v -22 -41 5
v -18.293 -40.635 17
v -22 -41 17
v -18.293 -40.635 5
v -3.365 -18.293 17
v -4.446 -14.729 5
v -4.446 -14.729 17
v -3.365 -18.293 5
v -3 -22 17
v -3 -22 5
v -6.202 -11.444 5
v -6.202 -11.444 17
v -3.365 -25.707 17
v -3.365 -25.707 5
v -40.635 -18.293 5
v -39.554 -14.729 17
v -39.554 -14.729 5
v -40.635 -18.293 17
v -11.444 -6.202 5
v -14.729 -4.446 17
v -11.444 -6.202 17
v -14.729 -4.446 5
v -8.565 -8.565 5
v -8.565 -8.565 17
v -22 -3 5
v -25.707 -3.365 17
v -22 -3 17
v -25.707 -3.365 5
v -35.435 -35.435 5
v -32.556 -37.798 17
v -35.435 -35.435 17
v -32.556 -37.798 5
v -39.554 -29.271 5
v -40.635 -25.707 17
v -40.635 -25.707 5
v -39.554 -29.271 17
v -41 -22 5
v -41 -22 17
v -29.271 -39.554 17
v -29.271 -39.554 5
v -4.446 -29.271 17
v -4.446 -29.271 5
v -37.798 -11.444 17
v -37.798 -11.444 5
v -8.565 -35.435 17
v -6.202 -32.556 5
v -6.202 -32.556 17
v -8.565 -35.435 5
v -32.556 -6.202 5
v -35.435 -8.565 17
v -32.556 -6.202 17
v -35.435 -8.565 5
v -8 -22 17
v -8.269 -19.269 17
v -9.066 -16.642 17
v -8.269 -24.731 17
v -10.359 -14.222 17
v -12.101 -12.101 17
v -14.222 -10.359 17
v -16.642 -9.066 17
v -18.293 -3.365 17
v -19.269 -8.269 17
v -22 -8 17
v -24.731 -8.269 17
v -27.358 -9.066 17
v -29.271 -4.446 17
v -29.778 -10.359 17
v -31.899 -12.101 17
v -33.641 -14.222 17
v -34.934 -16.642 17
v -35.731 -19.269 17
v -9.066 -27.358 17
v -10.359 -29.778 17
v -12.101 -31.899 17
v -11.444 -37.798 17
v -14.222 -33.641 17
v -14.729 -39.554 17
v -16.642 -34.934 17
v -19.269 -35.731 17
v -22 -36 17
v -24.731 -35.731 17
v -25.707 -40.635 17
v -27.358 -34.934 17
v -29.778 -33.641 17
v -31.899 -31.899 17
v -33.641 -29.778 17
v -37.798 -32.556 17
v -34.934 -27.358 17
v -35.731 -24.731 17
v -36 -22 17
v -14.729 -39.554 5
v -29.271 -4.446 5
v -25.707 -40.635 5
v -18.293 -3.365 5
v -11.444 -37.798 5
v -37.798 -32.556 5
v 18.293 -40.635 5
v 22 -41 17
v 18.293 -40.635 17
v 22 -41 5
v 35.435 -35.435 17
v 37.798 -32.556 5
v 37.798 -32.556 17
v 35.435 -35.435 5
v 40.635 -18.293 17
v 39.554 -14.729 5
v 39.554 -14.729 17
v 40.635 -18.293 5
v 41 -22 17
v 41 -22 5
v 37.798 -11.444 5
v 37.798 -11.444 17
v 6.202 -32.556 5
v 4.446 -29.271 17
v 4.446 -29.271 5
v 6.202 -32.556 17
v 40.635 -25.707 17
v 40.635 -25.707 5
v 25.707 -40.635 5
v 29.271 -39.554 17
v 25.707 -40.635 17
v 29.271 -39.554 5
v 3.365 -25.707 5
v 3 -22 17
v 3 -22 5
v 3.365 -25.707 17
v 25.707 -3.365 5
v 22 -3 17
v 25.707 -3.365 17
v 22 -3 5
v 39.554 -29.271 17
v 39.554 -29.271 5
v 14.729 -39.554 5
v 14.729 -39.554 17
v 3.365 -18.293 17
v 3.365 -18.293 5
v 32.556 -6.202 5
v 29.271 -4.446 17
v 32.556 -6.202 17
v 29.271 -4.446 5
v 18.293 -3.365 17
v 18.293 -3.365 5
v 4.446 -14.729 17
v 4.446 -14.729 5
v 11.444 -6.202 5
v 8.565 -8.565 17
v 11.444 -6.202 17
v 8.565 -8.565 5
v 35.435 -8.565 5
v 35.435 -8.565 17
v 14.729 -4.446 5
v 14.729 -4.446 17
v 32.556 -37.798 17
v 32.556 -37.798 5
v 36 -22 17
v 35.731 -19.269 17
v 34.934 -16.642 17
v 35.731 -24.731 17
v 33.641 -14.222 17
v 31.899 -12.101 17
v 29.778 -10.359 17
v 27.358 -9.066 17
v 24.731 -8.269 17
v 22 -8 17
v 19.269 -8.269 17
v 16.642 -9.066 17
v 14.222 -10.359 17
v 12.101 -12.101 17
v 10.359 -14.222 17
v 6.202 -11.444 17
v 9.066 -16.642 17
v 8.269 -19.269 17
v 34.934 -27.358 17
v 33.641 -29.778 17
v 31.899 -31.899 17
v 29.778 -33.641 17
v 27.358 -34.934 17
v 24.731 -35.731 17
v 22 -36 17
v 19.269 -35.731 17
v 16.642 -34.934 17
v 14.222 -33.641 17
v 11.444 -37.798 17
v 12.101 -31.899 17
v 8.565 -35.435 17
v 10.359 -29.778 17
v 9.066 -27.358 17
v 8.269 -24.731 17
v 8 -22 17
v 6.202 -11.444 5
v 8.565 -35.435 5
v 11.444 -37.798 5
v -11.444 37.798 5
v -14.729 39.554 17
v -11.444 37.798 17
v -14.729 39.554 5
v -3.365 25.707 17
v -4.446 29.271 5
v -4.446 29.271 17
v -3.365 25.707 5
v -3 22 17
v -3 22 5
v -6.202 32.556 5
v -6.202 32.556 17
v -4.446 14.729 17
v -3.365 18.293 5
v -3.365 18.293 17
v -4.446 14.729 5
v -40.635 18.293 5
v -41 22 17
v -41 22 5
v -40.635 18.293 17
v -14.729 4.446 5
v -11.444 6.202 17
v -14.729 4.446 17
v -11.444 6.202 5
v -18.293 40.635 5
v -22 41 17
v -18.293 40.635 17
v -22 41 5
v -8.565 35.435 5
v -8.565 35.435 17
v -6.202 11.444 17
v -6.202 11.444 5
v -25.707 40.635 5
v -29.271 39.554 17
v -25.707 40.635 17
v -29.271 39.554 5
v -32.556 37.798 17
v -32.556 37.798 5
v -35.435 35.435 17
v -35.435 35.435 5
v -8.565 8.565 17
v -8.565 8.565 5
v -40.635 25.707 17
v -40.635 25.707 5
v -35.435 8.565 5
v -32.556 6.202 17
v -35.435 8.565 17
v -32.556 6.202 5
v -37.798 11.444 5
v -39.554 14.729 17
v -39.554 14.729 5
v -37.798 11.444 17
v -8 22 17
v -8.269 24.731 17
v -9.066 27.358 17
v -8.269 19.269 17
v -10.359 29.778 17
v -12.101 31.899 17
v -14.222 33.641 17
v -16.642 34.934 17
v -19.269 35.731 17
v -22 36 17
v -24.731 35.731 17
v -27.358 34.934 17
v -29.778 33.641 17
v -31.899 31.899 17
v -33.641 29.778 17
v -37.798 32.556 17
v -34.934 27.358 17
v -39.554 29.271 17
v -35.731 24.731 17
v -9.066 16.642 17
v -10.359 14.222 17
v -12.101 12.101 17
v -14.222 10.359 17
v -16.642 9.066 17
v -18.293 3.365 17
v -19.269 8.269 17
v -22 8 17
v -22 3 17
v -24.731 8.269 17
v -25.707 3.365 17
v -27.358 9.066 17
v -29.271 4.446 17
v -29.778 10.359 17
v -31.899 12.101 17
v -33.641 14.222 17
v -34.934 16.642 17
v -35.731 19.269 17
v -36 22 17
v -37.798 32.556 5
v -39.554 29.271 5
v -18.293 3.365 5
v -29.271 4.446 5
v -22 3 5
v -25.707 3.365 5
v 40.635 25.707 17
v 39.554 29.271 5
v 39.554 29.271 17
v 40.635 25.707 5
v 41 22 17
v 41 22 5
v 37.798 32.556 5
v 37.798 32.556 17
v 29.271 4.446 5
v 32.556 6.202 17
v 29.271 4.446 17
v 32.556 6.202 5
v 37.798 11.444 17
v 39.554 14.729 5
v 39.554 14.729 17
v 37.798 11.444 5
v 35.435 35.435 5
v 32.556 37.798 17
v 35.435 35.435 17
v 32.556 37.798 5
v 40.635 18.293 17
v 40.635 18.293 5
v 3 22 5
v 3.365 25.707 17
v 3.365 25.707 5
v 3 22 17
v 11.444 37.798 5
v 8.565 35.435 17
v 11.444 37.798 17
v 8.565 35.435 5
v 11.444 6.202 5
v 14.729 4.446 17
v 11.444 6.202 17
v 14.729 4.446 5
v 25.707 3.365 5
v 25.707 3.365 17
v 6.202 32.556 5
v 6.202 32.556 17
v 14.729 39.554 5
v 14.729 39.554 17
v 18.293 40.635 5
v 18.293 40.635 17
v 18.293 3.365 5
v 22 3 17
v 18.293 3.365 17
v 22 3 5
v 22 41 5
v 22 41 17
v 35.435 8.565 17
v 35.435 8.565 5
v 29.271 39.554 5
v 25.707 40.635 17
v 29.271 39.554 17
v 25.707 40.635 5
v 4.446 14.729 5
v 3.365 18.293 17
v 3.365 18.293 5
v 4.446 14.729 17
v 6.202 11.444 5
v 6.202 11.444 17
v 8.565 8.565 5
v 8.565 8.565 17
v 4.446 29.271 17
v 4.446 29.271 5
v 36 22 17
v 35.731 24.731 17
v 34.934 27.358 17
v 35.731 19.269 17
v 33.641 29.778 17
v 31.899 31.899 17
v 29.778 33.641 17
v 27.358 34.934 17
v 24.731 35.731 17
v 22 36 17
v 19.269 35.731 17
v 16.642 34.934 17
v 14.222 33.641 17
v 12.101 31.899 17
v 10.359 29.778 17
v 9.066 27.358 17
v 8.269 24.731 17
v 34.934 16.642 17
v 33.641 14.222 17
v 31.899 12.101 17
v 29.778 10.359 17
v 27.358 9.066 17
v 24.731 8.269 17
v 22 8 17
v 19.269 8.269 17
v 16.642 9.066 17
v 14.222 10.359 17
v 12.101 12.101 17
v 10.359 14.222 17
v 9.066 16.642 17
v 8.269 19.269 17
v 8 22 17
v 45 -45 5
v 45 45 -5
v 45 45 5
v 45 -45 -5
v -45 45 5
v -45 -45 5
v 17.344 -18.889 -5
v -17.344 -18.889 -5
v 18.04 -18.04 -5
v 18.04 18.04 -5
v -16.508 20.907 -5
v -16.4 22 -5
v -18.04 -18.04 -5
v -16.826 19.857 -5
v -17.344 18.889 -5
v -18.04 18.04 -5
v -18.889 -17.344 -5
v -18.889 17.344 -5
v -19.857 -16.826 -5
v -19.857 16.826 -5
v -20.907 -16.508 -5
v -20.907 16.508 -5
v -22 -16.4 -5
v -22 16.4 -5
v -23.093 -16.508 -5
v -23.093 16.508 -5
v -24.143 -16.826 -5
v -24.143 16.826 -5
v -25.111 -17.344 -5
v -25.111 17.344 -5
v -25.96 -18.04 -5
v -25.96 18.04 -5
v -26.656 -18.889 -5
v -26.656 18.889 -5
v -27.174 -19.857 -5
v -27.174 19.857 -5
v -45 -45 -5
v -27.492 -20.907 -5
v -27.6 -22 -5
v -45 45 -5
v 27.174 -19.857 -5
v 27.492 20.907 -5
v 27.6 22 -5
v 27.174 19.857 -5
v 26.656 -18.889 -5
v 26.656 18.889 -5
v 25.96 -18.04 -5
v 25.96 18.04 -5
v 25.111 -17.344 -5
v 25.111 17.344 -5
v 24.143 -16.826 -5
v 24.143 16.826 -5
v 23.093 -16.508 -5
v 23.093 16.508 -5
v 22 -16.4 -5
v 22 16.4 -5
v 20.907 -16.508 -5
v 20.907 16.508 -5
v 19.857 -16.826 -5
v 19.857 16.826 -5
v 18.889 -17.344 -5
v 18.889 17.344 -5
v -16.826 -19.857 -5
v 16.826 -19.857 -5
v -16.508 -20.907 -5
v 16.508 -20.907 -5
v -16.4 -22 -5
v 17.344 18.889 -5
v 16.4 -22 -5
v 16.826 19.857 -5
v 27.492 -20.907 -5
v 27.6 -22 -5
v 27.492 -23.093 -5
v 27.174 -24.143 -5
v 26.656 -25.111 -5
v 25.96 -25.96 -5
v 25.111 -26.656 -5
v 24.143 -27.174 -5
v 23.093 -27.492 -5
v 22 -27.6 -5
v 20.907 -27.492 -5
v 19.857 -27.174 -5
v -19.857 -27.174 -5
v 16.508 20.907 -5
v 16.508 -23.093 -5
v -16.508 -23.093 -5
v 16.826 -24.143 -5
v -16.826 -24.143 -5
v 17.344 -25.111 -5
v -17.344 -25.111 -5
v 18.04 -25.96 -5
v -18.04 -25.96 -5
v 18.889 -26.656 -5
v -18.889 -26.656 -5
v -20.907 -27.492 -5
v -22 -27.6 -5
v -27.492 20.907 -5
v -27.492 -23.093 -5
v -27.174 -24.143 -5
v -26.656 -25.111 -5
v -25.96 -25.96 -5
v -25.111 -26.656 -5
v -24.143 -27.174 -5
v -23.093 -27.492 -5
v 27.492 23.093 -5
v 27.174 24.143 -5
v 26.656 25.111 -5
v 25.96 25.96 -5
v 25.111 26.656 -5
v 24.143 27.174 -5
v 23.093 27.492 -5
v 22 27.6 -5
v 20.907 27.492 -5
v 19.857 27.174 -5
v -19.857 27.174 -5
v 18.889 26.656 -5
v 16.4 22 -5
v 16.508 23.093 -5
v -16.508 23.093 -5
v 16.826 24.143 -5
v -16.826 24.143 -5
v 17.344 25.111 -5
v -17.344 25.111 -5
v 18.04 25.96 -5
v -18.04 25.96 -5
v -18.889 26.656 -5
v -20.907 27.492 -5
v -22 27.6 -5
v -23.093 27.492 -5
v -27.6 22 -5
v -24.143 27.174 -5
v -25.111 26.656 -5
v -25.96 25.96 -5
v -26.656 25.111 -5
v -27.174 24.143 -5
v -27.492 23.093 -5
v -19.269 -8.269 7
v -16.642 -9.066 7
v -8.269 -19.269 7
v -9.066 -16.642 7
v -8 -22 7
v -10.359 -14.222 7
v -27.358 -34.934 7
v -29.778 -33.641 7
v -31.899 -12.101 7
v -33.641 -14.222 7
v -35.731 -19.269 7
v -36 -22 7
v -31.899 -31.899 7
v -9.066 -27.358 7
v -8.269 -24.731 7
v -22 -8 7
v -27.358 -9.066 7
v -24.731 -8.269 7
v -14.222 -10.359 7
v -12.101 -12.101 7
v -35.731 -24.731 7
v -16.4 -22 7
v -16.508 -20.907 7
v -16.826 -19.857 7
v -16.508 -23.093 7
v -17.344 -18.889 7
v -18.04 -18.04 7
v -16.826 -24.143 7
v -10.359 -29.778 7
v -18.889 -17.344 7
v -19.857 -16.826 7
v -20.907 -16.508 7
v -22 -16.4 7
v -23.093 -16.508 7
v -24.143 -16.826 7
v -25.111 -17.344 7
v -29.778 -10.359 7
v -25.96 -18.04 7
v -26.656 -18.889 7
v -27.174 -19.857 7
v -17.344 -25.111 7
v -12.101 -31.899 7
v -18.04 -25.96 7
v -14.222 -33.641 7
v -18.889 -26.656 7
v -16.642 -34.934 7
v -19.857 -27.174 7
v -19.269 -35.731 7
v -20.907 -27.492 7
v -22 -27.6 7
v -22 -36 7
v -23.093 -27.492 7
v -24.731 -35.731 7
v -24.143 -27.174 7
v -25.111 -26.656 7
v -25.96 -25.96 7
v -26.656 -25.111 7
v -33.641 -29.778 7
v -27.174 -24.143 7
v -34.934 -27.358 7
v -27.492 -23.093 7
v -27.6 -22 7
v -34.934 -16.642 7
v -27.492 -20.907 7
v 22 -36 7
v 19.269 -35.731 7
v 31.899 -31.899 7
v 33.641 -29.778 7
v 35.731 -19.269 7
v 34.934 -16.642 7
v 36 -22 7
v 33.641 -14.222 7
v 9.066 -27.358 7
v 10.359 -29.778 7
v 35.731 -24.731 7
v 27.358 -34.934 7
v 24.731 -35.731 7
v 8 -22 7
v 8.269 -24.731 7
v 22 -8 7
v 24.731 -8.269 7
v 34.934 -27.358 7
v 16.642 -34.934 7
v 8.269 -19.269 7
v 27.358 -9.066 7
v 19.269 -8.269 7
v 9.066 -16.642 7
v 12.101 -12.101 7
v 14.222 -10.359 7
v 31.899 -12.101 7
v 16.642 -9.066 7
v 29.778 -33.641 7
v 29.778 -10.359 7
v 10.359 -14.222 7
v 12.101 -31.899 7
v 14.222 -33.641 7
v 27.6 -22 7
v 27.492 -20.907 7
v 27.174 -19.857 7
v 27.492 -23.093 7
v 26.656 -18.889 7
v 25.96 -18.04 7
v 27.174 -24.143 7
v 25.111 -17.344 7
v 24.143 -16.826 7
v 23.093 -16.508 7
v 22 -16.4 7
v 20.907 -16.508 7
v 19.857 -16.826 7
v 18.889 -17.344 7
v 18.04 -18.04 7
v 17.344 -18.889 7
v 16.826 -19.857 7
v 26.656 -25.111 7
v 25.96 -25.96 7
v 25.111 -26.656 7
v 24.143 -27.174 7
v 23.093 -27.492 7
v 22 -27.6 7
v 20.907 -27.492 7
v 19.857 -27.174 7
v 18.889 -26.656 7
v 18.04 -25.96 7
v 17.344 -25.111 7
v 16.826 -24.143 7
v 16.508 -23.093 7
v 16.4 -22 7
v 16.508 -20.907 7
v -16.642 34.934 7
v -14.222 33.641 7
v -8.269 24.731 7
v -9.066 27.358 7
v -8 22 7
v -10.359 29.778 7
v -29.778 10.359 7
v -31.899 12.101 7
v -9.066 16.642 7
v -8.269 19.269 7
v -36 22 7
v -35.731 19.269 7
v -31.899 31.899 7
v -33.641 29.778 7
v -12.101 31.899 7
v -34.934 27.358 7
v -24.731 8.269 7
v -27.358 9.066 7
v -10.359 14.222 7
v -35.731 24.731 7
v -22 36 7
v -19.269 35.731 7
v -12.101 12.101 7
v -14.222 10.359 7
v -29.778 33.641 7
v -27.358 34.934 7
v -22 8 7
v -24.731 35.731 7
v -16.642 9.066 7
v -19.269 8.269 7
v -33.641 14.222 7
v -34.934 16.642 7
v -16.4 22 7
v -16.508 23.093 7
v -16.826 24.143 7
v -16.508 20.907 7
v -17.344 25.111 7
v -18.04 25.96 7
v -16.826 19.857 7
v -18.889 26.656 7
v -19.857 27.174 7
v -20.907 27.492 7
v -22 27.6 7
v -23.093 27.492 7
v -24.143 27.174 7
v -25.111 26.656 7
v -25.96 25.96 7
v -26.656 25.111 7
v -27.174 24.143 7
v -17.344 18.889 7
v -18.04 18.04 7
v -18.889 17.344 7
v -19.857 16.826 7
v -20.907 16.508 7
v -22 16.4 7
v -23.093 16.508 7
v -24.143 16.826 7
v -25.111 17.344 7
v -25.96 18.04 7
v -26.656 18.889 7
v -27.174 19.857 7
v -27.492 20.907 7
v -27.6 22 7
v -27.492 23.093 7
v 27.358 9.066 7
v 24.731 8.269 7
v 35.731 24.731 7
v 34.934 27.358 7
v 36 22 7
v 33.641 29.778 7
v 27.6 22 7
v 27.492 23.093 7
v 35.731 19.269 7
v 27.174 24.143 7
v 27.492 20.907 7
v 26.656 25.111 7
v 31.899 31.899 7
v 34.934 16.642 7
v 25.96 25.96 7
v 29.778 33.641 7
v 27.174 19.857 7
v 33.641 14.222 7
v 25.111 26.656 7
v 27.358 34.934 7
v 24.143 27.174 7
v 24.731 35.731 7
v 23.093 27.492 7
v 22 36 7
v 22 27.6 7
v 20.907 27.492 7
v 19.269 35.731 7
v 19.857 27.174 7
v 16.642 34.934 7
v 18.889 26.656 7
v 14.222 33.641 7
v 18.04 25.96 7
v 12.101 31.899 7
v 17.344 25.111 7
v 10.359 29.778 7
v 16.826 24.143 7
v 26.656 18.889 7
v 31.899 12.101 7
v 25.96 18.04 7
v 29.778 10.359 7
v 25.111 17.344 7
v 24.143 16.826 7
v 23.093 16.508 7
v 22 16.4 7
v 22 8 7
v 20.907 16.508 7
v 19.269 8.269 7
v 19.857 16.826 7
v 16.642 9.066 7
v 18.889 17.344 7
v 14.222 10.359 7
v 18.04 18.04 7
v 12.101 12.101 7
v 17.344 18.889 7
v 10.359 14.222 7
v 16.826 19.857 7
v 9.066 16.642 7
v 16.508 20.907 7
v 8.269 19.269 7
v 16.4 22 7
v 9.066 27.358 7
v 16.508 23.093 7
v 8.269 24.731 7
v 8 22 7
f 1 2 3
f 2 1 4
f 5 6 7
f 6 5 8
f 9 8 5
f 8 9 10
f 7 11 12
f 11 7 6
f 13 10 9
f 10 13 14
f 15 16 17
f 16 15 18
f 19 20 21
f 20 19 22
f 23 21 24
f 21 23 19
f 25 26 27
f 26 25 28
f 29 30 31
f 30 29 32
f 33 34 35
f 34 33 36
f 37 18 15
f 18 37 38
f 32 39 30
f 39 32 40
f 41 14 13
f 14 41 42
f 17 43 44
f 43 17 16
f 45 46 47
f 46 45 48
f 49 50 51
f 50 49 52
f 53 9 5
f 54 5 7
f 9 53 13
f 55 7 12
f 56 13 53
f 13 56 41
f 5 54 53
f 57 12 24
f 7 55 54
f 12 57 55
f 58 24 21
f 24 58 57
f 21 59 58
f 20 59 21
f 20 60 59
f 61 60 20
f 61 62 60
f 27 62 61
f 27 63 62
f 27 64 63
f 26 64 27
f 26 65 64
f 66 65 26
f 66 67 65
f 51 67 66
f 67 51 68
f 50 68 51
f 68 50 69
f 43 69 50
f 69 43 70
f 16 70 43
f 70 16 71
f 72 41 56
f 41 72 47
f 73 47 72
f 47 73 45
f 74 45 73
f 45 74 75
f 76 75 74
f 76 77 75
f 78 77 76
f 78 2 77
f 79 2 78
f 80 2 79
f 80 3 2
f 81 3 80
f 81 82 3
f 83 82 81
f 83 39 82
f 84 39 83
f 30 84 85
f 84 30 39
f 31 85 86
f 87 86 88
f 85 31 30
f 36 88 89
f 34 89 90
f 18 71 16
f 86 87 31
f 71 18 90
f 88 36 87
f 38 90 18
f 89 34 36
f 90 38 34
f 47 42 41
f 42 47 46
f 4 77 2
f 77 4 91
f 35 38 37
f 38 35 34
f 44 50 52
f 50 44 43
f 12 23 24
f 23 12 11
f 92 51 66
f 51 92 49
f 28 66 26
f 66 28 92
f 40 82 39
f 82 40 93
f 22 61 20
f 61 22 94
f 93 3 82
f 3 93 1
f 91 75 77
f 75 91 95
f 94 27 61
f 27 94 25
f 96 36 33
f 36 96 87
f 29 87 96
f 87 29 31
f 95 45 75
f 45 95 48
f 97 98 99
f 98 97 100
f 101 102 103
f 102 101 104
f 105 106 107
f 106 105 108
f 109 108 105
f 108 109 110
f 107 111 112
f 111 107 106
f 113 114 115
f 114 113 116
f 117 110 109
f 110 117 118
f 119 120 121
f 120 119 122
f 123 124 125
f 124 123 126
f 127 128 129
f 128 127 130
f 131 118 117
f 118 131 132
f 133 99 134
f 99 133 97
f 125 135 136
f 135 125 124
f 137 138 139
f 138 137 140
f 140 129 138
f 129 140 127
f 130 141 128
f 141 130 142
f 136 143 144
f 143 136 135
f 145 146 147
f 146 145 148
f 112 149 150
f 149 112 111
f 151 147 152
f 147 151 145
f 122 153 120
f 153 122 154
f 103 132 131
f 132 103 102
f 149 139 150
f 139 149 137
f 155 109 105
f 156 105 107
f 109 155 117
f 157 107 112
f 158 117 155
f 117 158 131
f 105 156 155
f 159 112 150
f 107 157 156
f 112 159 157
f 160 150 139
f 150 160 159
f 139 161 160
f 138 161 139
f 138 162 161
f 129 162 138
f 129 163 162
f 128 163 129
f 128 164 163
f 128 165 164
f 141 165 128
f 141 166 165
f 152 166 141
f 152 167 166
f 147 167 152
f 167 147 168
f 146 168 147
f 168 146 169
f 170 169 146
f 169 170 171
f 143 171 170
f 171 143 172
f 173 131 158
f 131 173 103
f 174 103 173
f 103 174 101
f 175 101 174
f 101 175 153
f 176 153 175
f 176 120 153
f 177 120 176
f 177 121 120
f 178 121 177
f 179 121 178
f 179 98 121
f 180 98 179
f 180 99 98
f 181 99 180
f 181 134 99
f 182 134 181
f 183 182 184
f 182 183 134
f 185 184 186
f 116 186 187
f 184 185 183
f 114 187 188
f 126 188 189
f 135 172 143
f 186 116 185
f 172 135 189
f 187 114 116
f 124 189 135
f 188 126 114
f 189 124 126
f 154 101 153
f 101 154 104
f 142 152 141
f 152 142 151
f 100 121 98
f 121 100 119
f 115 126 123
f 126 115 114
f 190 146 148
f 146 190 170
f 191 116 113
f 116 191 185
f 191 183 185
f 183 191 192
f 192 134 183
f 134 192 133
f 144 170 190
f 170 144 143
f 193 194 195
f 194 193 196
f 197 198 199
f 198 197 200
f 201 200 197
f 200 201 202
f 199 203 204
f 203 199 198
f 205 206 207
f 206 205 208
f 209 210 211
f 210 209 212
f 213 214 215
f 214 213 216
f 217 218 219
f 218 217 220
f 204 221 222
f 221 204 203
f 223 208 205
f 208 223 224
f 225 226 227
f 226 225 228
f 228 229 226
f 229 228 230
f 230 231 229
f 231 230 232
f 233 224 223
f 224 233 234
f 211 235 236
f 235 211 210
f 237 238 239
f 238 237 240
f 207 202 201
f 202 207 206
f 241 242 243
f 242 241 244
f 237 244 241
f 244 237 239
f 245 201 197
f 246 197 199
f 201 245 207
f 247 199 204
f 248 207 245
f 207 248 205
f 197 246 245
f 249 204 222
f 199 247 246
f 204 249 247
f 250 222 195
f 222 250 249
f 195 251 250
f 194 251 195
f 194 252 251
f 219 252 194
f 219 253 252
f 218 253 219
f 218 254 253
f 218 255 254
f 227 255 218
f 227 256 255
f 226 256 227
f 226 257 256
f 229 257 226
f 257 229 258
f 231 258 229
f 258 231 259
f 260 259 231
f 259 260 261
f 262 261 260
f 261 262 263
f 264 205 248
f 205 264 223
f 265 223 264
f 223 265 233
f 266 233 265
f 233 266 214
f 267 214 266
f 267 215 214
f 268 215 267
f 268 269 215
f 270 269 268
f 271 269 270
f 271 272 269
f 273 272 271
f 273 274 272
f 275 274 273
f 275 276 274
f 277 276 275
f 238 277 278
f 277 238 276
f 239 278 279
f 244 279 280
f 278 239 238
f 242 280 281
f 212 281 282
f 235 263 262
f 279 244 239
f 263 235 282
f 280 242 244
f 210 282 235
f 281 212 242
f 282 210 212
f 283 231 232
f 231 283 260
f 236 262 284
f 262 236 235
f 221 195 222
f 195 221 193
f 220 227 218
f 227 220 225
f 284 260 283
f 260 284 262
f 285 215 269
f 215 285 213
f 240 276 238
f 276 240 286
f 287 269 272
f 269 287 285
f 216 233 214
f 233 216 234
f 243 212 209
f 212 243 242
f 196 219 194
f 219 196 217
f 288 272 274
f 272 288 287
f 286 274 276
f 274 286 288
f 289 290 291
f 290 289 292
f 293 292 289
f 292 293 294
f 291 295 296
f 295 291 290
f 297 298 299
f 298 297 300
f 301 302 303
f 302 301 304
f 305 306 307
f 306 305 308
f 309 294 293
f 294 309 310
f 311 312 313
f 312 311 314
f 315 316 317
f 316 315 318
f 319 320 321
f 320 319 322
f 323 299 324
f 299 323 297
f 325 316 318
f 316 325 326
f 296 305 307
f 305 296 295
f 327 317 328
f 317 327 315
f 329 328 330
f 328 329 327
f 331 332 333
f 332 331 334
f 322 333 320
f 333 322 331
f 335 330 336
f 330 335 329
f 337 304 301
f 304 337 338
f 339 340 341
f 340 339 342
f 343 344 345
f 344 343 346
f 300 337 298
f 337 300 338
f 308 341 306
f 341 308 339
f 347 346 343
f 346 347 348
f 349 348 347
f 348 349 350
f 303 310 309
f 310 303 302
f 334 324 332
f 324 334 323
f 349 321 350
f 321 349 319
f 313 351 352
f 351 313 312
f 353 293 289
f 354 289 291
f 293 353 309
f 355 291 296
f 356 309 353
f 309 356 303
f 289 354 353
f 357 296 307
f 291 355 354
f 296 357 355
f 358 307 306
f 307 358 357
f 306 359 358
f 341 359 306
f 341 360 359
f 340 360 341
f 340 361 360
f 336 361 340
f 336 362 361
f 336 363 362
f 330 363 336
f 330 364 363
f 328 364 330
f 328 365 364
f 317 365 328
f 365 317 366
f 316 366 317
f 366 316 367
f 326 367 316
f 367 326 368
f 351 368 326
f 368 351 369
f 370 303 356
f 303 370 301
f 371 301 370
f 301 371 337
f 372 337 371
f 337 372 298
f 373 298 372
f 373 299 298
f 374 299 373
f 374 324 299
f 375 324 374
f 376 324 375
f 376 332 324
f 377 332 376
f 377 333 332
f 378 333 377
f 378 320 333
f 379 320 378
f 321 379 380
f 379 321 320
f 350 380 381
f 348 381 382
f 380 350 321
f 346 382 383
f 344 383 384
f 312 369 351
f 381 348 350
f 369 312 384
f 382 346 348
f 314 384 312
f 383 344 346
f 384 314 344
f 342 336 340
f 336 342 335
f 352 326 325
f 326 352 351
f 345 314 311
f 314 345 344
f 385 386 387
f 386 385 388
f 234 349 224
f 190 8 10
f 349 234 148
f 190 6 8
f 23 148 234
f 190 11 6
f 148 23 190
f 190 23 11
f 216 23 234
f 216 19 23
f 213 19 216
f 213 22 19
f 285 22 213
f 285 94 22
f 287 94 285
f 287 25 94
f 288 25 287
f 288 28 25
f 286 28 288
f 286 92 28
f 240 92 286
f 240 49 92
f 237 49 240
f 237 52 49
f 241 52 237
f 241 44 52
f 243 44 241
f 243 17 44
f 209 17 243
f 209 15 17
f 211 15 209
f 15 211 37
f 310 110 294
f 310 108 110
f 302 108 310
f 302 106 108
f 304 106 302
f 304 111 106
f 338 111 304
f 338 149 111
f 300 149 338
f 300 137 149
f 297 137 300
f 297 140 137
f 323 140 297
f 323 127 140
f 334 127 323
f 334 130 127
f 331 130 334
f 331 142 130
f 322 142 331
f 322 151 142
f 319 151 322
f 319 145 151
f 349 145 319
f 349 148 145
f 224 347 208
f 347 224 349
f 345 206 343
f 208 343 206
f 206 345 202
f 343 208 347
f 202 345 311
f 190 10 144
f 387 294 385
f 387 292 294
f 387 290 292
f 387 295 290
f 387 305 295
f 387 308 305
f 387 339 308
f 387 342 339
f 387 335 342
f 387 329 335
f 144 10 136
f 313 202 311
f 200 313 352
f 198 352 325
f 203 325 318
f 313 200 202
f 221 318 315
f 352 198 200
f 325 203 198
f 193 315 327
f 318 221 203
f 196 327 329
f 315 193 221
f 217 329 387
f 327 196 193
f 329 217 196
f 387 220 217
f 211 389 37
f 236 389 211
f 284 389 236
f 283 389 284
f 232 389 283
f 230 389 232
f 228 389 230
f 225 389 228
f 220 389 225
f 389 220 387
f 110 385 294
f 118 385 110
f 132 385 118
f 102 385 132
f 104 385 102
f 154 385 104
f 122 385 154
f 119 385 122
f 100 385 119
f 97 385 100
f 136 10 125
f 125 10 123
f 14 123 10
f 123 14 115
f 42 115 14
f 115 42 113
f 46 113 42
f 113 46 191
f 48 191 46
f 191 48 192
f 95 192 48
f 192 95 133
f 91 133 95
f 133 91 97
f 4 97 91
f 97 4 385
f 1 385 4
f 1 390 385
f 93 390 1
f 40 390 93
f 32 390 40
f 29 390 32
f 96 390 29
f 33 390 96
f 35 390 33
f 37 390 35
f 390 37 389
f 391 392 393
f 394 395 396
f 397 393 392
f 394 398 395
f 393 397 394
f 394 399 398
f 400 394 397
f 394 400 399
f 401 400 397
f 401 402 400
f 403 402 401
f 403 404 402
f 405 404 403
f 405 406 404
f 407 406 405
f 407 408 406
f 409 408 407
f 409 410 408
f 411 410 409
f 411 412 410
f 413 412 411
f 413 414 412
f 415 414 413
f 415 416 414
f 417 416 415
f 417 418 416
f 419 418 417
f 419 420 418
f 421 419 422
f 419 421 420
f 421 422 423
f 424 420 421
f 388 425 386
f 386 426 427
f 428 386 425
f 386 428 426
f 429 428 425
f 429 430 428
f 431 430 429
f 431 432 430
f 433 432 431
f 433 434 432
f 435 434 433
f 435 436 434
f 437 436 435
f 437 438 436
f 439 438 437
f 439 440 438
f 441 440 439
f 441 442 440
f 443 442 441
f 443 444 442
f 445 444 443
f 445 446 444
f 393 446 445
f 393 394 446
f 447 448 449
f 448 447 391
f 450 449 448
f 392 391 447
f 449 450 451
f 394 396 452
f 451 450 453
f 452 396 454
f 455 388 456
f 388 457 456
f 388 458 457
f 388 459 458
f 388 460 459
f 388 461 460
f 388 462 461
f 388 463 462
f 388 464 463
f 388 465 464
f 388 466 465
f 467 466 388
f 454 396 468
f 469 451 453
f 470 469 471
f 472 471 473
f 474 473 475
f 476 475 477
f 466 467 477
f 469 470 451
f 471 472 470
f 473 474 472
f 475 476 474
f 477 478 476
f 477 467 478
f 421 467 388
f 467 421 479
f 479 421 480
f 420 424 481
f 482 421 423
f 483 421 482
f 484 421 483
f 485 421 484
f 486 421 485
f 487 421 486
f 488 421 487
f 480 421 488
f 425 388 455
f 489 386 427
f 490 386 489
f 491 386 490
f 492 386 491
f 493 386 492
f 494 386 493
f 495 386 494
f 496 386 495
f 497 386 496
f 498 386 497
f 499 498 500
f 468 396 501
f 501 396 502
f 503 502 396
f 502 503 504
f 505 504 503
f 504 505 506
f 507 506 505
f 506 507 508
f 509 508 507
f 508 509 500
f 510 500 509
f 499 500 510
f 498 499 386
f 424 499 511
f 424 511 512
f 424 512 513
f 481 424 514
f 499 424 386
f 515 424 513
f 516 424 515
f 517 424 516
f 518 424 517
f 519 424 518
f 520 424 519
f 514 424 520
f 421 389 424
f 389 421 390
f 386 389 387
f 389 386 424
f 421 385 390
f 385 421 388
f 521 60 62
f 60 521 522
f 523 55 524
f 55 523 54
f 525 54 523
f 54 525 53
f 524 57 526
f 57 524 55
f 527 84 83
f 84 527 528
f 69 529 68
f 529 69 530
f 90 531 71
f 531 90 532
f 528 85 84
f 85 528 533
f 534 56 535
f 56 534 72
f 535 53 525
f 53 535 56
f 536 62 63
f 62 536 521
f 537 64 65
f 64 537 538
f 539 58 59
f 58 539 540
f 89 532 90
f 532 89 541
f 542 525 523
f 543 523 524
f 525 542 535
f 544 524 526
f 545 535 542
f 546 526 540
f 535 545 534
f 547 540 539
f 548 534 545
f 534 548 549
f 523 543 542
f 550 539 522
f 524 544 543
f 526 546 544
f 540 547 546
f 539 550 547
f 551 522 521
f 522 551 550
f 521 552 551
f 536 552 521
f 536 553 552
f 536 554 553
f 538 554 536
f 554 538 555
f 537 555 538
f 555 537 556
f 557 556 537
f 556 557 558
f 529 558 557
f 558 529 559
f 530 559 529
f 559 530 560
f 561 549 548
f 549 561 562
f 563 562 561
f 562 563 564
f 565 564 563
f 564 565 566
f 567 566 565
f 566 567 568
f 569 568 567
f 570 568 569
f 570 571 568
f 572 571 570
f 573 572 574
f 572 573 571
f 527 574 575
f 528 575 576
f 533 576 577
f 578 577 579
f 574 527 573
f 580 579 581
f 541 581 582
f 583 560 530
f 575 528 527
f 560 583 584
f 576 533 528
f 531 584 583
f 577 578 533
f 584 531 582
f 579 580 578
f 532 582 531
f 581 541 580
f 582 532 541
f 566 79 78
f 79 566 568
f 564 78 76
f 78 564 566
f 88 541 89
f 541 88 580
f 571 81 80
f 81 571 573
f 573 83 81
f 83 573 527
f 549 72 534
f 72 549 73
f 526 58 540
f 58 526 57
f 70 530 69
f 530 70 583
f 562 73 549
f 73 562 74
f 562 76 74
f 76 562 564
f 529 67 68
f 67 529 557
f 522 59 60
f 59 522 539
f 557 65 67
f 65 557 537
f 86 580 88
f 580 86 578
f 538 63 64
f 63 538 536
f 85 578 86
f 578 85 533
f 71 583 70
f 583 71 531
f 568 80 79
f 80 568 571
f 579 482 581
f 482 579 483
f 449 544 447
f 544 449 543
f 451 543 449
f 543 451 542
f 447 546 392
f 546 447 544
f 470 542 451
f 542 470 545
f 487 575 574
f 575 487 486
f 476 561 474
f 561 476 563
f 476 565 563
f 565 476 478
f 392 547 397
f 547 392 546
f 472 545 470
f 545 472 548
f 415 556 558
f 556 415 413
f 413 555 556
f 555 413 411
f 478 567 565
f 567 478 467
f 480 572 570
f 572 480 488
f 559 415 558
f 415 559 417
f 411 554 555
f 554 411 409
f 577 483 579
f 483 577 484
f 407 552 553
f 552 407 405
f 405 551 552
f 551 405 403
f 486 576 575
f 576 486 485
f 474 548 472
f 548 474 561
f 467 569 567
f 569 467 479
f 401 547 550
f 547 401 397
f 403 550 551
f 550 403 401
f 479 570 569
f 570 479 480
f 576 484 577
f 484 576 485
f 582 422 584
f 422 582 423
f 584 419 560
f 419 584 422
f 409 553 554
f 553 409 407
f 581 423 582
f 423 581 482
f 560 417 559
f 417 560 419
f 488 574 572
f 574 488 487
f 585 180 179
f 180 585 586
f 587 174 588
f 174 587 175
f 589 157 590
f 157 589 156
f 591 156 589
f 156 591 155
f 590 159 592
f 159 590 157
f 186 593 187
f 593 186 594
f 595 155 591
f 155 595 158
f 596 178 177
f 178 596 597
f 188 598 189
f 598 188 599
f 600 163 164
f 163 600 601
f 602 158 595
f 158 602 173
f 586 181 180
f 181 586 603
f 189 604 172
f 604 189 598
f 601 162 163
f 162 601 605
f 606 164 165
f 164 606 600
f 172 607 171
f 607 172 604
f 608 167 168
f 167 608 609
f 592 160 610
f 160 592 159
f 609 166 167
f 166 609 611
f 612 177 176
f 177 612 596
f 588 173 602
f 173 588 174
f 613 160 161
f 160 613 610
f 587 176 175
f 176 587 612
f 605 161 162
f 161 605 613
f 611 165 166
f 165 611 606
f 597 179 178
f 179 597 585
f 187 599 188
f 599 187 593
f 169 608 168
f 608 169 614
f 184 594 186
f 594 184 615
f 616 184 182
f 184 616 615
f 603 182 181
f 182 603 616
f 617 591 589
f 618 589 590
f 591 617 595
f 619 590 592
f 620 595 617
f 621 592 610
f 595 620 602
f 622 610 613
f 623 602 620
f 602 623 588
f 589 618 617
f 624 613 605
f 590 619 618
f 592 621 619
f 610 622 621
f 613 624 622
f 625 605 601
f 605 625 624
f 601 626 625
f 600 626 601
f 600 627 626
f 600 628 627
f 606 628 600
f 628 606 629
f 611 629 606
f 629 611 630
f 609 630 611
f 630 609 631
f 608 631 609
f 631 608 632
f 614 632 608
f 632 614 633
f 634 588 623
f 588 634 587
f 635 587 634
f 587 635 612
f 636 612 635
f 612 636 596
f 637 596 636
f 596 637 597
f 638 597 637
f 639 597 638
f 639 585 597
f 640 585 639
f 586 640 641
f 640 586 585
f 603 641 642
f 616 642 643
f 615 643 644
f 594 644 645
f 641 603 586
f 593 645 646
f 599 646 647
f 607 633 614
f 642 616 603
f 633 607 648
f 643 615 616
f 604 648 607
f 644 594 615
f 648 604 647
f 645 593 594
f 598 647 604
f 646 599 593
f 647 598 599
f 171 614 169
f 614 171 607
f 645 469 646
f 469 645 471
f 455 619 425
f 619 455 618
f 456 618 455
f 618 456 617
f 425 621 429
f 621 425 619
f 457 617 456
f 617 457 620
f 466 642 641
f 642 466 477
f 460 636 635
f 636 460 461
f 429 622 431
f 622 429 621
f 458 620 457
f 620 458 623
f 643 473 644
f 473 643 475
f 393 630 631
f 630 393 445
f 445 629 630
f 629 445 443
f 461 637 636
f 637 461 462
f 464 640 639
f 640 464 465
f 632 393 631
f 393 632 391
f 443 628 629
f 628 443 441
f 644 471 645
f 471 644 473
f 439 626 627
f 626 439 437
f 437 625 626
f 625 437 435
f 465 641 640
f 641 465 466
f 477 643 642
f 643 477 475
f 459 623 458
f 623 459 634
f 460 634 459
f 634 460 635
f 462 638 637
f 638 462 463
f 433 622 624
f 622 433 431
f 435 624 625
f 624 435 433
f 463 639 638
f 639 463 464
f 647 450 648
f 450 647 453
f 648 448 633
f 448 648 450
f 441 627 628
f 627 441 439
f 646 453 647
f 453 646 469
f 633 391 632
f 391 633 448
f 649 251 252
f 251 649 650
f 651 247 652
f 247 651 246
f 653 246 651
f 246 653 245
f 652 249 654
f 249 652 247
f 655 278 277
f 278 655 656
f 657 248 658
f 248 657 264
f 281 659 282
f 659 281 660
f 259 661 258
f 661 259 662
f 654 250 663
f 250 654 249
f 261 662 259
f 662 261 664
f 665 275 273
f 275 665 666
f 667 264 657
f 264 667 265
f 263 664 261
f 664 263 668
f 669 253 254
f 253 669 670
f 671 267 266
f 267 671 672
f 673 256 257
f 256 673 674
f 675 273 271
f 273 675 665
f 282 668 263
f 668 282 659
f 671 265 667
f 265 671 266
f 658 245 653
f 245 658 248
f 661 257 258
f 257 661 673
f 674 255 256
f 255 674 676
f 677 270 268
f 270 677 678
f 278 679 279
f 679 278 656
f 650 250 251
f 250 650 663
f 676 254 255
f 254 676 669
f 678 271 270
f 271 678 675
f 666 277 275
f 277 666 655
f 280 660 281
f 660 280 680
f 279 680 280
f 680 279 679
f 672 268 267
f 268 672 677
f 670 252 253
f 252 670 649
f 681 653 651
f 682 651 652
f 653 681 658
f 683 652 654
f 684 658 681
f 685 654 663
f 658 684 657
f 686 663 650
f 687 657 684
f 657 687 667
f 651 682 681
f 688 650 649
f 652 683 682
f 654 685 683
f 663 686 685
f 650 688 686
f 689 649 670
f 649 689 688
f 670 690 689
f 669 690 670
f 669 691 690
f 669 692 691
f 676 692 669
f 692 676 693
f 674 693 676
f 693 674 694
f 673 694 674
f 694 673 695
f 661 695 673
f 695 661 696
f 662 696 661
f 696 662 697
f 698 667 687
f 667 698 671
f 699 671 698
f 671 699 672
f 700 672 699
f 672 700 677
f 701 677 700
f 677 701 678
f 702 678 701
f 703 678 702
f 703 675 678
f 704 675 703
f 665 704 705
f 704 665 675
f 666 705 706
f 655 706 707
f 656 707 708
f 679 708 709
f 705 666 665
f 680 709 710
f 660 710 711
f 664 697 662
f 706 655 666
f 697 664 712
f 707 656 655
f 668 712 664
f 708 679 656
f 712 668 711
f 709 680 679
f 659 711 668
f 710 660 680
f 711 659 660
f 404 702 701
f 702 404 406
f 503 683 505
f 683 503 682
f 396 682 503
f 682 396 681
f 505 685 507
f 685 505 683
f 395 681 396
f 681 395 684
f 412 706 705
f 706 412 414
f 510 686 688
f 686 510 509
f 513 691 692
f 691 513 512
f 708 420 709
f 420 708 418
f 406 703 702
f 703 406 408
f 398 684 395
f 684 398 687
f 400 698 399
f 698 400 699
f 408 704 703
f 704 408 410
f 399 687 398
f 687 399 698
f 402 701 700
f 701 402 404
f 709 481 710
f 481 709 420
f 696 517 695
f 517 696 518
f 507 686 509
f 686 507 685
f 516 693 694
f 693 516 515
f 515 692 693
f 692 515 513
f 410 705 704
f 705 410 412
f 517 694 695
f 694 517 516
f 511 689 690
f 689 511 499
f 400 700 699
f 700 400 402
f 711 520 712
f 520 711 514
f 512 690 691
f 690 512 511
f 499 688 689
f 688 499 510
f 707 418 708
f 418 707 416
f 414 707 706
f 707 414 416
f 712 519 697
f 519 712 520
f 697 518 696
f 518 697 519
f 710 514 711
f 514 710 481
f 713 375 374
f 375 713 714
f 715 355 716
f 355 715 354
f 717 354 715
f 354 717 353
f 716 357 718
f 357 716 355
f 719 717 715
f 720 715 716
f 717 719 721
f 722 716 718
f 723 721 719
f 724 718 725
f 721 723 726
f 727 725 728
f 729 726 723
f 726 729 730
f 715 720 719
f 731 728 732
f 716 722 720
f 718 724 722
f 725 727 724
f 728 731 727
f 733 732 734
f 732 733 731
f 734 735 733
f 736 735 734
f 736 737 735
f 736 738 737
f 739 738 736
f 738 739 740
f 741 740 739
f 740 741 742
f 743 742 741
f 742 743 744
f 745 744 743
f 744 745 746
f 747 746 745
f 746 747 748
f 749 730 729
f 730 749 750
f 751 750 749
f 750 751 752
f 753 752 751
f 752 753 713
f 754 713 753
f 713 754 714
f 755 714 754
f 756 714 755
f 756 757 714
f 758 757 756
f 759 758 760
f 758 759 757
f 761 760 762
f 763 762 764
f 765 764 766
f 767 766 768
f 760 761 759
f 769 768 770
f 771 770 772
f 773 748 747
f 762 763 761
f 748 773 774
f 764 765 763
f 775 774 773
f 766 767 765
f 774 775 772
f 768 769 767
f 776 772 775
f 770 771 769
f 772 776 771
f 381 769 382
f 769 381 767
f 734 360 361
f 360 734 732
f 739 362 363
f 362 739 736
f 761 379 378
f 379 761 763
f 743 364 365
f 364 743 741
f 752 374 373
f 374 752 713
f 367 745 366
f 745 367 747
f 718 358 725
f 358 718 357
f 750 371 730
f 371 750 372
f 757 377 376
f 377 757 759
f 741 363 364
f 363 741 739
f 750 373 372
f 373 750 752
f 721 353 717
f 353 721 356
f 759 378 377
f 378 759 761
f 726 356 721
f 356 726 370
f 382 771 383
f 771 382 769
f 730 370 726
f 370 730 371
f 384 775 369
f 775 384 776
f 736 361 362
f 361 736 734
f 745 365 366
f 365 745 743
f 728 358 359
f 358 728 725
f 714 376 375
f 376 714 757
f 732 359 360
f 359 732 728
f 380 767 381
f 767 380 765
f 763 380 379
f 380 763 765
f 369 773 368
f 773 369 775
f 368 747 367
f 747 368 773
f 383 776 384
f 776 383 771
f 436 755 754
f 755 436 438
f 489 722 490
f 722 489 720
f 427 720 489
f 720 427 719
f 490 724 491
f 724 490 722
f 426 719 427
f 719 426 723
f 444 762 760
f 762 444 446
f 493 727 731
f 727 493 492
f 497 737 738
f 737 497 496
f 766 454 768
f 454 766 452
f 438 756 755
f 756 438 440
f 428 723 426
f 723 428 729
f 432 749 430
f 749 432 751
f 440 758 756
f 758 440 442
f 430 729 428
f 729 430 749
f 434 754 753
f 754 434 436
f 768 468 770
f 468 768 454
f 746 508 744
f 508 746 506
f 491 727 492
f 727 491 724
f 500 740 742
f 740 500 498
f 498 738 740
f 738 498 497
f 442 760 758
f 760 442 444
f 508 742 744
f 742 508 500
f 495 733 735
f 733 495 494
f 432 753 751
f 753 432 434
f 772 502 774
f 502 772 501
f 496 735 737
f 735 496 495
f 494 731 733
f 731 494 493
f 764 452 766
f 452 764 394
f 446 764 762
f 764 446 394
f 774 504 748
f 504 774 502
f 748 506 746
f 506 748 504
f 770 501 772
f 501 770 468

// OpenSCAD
$fn = 32;

// ----------------------------------------------------------------------
// Socket pad plate
// bosses with counterbored sockets for the screws
// ----------------------------------------------------------------------

// --- parameters (mm) ---
base_t = 10;        // base plate thickness
boss_h = 12;        // boss height above the base plate
boss_d = 38;        // boss diameter
socket_d = 28;      // socket diameter
socket_depth = 10;  // socket depth from the boss face
bolt_d = 11.2;      // screw clearance hole through the socket floor
rows = 2;           // boss rows
cols = 2;           // bosses per row
pitch = 44;         // boss pitch

// --- derived feature positions (mm) ---
height = base_t + boss_h;           // = 22   overall height of the part
plate = [pitch * (cols - 1) + boss_d + 8, pitch * (rows - 1) + boss_d + 8, base_t];  // = [90, 90, 10]   overall size (x, y, z)
span_x = pitch * (cols - 1);        // = 44   distance between outer bosses
span_y = pitch * (rows - 1);        // = 44   distance between boss rows
origin_x = -span_x / 2;             // = -22   X of the first boss
origin_y = -span_y / 2;             // = -22   Y of the first boss
feature_centers = [
  [origin_x + 0 * pitch, origin_y + 0 * pitch],
  [origin_x + 1 * pitch, origin_y + 0 * pitch],
  [origin_x + 0 * pitch, origin_y + 1 * pitch],
  [origin_x + 1 * pitch, origin_y + 1 * pitch]
];   // boss centres: sockets, holes and the pads themselves are placed from here

// base plate, bosses on feature_centers, socket + through hole in each
difference() {
  union() {
    cube(plate, center = true);
    for (centre = feature_centers)
      translate([centre[0], centre[1], plate[2] / 2 - 1])
        cylinder(d = boss_d, h = boss_h + 1);
  }
  for (centre = feature_centers) {
    translate([centre[0], centre[1], plate[2] / 2 + boss_h - socket_depth])
      cylinder(d = socket_d, h = socket_depth + 1);
    translate([centre[0], centre[1], -height])
      cylinder(d = bolt_d, h = 2 * height + 2);  // through the socket floor
  }
}
